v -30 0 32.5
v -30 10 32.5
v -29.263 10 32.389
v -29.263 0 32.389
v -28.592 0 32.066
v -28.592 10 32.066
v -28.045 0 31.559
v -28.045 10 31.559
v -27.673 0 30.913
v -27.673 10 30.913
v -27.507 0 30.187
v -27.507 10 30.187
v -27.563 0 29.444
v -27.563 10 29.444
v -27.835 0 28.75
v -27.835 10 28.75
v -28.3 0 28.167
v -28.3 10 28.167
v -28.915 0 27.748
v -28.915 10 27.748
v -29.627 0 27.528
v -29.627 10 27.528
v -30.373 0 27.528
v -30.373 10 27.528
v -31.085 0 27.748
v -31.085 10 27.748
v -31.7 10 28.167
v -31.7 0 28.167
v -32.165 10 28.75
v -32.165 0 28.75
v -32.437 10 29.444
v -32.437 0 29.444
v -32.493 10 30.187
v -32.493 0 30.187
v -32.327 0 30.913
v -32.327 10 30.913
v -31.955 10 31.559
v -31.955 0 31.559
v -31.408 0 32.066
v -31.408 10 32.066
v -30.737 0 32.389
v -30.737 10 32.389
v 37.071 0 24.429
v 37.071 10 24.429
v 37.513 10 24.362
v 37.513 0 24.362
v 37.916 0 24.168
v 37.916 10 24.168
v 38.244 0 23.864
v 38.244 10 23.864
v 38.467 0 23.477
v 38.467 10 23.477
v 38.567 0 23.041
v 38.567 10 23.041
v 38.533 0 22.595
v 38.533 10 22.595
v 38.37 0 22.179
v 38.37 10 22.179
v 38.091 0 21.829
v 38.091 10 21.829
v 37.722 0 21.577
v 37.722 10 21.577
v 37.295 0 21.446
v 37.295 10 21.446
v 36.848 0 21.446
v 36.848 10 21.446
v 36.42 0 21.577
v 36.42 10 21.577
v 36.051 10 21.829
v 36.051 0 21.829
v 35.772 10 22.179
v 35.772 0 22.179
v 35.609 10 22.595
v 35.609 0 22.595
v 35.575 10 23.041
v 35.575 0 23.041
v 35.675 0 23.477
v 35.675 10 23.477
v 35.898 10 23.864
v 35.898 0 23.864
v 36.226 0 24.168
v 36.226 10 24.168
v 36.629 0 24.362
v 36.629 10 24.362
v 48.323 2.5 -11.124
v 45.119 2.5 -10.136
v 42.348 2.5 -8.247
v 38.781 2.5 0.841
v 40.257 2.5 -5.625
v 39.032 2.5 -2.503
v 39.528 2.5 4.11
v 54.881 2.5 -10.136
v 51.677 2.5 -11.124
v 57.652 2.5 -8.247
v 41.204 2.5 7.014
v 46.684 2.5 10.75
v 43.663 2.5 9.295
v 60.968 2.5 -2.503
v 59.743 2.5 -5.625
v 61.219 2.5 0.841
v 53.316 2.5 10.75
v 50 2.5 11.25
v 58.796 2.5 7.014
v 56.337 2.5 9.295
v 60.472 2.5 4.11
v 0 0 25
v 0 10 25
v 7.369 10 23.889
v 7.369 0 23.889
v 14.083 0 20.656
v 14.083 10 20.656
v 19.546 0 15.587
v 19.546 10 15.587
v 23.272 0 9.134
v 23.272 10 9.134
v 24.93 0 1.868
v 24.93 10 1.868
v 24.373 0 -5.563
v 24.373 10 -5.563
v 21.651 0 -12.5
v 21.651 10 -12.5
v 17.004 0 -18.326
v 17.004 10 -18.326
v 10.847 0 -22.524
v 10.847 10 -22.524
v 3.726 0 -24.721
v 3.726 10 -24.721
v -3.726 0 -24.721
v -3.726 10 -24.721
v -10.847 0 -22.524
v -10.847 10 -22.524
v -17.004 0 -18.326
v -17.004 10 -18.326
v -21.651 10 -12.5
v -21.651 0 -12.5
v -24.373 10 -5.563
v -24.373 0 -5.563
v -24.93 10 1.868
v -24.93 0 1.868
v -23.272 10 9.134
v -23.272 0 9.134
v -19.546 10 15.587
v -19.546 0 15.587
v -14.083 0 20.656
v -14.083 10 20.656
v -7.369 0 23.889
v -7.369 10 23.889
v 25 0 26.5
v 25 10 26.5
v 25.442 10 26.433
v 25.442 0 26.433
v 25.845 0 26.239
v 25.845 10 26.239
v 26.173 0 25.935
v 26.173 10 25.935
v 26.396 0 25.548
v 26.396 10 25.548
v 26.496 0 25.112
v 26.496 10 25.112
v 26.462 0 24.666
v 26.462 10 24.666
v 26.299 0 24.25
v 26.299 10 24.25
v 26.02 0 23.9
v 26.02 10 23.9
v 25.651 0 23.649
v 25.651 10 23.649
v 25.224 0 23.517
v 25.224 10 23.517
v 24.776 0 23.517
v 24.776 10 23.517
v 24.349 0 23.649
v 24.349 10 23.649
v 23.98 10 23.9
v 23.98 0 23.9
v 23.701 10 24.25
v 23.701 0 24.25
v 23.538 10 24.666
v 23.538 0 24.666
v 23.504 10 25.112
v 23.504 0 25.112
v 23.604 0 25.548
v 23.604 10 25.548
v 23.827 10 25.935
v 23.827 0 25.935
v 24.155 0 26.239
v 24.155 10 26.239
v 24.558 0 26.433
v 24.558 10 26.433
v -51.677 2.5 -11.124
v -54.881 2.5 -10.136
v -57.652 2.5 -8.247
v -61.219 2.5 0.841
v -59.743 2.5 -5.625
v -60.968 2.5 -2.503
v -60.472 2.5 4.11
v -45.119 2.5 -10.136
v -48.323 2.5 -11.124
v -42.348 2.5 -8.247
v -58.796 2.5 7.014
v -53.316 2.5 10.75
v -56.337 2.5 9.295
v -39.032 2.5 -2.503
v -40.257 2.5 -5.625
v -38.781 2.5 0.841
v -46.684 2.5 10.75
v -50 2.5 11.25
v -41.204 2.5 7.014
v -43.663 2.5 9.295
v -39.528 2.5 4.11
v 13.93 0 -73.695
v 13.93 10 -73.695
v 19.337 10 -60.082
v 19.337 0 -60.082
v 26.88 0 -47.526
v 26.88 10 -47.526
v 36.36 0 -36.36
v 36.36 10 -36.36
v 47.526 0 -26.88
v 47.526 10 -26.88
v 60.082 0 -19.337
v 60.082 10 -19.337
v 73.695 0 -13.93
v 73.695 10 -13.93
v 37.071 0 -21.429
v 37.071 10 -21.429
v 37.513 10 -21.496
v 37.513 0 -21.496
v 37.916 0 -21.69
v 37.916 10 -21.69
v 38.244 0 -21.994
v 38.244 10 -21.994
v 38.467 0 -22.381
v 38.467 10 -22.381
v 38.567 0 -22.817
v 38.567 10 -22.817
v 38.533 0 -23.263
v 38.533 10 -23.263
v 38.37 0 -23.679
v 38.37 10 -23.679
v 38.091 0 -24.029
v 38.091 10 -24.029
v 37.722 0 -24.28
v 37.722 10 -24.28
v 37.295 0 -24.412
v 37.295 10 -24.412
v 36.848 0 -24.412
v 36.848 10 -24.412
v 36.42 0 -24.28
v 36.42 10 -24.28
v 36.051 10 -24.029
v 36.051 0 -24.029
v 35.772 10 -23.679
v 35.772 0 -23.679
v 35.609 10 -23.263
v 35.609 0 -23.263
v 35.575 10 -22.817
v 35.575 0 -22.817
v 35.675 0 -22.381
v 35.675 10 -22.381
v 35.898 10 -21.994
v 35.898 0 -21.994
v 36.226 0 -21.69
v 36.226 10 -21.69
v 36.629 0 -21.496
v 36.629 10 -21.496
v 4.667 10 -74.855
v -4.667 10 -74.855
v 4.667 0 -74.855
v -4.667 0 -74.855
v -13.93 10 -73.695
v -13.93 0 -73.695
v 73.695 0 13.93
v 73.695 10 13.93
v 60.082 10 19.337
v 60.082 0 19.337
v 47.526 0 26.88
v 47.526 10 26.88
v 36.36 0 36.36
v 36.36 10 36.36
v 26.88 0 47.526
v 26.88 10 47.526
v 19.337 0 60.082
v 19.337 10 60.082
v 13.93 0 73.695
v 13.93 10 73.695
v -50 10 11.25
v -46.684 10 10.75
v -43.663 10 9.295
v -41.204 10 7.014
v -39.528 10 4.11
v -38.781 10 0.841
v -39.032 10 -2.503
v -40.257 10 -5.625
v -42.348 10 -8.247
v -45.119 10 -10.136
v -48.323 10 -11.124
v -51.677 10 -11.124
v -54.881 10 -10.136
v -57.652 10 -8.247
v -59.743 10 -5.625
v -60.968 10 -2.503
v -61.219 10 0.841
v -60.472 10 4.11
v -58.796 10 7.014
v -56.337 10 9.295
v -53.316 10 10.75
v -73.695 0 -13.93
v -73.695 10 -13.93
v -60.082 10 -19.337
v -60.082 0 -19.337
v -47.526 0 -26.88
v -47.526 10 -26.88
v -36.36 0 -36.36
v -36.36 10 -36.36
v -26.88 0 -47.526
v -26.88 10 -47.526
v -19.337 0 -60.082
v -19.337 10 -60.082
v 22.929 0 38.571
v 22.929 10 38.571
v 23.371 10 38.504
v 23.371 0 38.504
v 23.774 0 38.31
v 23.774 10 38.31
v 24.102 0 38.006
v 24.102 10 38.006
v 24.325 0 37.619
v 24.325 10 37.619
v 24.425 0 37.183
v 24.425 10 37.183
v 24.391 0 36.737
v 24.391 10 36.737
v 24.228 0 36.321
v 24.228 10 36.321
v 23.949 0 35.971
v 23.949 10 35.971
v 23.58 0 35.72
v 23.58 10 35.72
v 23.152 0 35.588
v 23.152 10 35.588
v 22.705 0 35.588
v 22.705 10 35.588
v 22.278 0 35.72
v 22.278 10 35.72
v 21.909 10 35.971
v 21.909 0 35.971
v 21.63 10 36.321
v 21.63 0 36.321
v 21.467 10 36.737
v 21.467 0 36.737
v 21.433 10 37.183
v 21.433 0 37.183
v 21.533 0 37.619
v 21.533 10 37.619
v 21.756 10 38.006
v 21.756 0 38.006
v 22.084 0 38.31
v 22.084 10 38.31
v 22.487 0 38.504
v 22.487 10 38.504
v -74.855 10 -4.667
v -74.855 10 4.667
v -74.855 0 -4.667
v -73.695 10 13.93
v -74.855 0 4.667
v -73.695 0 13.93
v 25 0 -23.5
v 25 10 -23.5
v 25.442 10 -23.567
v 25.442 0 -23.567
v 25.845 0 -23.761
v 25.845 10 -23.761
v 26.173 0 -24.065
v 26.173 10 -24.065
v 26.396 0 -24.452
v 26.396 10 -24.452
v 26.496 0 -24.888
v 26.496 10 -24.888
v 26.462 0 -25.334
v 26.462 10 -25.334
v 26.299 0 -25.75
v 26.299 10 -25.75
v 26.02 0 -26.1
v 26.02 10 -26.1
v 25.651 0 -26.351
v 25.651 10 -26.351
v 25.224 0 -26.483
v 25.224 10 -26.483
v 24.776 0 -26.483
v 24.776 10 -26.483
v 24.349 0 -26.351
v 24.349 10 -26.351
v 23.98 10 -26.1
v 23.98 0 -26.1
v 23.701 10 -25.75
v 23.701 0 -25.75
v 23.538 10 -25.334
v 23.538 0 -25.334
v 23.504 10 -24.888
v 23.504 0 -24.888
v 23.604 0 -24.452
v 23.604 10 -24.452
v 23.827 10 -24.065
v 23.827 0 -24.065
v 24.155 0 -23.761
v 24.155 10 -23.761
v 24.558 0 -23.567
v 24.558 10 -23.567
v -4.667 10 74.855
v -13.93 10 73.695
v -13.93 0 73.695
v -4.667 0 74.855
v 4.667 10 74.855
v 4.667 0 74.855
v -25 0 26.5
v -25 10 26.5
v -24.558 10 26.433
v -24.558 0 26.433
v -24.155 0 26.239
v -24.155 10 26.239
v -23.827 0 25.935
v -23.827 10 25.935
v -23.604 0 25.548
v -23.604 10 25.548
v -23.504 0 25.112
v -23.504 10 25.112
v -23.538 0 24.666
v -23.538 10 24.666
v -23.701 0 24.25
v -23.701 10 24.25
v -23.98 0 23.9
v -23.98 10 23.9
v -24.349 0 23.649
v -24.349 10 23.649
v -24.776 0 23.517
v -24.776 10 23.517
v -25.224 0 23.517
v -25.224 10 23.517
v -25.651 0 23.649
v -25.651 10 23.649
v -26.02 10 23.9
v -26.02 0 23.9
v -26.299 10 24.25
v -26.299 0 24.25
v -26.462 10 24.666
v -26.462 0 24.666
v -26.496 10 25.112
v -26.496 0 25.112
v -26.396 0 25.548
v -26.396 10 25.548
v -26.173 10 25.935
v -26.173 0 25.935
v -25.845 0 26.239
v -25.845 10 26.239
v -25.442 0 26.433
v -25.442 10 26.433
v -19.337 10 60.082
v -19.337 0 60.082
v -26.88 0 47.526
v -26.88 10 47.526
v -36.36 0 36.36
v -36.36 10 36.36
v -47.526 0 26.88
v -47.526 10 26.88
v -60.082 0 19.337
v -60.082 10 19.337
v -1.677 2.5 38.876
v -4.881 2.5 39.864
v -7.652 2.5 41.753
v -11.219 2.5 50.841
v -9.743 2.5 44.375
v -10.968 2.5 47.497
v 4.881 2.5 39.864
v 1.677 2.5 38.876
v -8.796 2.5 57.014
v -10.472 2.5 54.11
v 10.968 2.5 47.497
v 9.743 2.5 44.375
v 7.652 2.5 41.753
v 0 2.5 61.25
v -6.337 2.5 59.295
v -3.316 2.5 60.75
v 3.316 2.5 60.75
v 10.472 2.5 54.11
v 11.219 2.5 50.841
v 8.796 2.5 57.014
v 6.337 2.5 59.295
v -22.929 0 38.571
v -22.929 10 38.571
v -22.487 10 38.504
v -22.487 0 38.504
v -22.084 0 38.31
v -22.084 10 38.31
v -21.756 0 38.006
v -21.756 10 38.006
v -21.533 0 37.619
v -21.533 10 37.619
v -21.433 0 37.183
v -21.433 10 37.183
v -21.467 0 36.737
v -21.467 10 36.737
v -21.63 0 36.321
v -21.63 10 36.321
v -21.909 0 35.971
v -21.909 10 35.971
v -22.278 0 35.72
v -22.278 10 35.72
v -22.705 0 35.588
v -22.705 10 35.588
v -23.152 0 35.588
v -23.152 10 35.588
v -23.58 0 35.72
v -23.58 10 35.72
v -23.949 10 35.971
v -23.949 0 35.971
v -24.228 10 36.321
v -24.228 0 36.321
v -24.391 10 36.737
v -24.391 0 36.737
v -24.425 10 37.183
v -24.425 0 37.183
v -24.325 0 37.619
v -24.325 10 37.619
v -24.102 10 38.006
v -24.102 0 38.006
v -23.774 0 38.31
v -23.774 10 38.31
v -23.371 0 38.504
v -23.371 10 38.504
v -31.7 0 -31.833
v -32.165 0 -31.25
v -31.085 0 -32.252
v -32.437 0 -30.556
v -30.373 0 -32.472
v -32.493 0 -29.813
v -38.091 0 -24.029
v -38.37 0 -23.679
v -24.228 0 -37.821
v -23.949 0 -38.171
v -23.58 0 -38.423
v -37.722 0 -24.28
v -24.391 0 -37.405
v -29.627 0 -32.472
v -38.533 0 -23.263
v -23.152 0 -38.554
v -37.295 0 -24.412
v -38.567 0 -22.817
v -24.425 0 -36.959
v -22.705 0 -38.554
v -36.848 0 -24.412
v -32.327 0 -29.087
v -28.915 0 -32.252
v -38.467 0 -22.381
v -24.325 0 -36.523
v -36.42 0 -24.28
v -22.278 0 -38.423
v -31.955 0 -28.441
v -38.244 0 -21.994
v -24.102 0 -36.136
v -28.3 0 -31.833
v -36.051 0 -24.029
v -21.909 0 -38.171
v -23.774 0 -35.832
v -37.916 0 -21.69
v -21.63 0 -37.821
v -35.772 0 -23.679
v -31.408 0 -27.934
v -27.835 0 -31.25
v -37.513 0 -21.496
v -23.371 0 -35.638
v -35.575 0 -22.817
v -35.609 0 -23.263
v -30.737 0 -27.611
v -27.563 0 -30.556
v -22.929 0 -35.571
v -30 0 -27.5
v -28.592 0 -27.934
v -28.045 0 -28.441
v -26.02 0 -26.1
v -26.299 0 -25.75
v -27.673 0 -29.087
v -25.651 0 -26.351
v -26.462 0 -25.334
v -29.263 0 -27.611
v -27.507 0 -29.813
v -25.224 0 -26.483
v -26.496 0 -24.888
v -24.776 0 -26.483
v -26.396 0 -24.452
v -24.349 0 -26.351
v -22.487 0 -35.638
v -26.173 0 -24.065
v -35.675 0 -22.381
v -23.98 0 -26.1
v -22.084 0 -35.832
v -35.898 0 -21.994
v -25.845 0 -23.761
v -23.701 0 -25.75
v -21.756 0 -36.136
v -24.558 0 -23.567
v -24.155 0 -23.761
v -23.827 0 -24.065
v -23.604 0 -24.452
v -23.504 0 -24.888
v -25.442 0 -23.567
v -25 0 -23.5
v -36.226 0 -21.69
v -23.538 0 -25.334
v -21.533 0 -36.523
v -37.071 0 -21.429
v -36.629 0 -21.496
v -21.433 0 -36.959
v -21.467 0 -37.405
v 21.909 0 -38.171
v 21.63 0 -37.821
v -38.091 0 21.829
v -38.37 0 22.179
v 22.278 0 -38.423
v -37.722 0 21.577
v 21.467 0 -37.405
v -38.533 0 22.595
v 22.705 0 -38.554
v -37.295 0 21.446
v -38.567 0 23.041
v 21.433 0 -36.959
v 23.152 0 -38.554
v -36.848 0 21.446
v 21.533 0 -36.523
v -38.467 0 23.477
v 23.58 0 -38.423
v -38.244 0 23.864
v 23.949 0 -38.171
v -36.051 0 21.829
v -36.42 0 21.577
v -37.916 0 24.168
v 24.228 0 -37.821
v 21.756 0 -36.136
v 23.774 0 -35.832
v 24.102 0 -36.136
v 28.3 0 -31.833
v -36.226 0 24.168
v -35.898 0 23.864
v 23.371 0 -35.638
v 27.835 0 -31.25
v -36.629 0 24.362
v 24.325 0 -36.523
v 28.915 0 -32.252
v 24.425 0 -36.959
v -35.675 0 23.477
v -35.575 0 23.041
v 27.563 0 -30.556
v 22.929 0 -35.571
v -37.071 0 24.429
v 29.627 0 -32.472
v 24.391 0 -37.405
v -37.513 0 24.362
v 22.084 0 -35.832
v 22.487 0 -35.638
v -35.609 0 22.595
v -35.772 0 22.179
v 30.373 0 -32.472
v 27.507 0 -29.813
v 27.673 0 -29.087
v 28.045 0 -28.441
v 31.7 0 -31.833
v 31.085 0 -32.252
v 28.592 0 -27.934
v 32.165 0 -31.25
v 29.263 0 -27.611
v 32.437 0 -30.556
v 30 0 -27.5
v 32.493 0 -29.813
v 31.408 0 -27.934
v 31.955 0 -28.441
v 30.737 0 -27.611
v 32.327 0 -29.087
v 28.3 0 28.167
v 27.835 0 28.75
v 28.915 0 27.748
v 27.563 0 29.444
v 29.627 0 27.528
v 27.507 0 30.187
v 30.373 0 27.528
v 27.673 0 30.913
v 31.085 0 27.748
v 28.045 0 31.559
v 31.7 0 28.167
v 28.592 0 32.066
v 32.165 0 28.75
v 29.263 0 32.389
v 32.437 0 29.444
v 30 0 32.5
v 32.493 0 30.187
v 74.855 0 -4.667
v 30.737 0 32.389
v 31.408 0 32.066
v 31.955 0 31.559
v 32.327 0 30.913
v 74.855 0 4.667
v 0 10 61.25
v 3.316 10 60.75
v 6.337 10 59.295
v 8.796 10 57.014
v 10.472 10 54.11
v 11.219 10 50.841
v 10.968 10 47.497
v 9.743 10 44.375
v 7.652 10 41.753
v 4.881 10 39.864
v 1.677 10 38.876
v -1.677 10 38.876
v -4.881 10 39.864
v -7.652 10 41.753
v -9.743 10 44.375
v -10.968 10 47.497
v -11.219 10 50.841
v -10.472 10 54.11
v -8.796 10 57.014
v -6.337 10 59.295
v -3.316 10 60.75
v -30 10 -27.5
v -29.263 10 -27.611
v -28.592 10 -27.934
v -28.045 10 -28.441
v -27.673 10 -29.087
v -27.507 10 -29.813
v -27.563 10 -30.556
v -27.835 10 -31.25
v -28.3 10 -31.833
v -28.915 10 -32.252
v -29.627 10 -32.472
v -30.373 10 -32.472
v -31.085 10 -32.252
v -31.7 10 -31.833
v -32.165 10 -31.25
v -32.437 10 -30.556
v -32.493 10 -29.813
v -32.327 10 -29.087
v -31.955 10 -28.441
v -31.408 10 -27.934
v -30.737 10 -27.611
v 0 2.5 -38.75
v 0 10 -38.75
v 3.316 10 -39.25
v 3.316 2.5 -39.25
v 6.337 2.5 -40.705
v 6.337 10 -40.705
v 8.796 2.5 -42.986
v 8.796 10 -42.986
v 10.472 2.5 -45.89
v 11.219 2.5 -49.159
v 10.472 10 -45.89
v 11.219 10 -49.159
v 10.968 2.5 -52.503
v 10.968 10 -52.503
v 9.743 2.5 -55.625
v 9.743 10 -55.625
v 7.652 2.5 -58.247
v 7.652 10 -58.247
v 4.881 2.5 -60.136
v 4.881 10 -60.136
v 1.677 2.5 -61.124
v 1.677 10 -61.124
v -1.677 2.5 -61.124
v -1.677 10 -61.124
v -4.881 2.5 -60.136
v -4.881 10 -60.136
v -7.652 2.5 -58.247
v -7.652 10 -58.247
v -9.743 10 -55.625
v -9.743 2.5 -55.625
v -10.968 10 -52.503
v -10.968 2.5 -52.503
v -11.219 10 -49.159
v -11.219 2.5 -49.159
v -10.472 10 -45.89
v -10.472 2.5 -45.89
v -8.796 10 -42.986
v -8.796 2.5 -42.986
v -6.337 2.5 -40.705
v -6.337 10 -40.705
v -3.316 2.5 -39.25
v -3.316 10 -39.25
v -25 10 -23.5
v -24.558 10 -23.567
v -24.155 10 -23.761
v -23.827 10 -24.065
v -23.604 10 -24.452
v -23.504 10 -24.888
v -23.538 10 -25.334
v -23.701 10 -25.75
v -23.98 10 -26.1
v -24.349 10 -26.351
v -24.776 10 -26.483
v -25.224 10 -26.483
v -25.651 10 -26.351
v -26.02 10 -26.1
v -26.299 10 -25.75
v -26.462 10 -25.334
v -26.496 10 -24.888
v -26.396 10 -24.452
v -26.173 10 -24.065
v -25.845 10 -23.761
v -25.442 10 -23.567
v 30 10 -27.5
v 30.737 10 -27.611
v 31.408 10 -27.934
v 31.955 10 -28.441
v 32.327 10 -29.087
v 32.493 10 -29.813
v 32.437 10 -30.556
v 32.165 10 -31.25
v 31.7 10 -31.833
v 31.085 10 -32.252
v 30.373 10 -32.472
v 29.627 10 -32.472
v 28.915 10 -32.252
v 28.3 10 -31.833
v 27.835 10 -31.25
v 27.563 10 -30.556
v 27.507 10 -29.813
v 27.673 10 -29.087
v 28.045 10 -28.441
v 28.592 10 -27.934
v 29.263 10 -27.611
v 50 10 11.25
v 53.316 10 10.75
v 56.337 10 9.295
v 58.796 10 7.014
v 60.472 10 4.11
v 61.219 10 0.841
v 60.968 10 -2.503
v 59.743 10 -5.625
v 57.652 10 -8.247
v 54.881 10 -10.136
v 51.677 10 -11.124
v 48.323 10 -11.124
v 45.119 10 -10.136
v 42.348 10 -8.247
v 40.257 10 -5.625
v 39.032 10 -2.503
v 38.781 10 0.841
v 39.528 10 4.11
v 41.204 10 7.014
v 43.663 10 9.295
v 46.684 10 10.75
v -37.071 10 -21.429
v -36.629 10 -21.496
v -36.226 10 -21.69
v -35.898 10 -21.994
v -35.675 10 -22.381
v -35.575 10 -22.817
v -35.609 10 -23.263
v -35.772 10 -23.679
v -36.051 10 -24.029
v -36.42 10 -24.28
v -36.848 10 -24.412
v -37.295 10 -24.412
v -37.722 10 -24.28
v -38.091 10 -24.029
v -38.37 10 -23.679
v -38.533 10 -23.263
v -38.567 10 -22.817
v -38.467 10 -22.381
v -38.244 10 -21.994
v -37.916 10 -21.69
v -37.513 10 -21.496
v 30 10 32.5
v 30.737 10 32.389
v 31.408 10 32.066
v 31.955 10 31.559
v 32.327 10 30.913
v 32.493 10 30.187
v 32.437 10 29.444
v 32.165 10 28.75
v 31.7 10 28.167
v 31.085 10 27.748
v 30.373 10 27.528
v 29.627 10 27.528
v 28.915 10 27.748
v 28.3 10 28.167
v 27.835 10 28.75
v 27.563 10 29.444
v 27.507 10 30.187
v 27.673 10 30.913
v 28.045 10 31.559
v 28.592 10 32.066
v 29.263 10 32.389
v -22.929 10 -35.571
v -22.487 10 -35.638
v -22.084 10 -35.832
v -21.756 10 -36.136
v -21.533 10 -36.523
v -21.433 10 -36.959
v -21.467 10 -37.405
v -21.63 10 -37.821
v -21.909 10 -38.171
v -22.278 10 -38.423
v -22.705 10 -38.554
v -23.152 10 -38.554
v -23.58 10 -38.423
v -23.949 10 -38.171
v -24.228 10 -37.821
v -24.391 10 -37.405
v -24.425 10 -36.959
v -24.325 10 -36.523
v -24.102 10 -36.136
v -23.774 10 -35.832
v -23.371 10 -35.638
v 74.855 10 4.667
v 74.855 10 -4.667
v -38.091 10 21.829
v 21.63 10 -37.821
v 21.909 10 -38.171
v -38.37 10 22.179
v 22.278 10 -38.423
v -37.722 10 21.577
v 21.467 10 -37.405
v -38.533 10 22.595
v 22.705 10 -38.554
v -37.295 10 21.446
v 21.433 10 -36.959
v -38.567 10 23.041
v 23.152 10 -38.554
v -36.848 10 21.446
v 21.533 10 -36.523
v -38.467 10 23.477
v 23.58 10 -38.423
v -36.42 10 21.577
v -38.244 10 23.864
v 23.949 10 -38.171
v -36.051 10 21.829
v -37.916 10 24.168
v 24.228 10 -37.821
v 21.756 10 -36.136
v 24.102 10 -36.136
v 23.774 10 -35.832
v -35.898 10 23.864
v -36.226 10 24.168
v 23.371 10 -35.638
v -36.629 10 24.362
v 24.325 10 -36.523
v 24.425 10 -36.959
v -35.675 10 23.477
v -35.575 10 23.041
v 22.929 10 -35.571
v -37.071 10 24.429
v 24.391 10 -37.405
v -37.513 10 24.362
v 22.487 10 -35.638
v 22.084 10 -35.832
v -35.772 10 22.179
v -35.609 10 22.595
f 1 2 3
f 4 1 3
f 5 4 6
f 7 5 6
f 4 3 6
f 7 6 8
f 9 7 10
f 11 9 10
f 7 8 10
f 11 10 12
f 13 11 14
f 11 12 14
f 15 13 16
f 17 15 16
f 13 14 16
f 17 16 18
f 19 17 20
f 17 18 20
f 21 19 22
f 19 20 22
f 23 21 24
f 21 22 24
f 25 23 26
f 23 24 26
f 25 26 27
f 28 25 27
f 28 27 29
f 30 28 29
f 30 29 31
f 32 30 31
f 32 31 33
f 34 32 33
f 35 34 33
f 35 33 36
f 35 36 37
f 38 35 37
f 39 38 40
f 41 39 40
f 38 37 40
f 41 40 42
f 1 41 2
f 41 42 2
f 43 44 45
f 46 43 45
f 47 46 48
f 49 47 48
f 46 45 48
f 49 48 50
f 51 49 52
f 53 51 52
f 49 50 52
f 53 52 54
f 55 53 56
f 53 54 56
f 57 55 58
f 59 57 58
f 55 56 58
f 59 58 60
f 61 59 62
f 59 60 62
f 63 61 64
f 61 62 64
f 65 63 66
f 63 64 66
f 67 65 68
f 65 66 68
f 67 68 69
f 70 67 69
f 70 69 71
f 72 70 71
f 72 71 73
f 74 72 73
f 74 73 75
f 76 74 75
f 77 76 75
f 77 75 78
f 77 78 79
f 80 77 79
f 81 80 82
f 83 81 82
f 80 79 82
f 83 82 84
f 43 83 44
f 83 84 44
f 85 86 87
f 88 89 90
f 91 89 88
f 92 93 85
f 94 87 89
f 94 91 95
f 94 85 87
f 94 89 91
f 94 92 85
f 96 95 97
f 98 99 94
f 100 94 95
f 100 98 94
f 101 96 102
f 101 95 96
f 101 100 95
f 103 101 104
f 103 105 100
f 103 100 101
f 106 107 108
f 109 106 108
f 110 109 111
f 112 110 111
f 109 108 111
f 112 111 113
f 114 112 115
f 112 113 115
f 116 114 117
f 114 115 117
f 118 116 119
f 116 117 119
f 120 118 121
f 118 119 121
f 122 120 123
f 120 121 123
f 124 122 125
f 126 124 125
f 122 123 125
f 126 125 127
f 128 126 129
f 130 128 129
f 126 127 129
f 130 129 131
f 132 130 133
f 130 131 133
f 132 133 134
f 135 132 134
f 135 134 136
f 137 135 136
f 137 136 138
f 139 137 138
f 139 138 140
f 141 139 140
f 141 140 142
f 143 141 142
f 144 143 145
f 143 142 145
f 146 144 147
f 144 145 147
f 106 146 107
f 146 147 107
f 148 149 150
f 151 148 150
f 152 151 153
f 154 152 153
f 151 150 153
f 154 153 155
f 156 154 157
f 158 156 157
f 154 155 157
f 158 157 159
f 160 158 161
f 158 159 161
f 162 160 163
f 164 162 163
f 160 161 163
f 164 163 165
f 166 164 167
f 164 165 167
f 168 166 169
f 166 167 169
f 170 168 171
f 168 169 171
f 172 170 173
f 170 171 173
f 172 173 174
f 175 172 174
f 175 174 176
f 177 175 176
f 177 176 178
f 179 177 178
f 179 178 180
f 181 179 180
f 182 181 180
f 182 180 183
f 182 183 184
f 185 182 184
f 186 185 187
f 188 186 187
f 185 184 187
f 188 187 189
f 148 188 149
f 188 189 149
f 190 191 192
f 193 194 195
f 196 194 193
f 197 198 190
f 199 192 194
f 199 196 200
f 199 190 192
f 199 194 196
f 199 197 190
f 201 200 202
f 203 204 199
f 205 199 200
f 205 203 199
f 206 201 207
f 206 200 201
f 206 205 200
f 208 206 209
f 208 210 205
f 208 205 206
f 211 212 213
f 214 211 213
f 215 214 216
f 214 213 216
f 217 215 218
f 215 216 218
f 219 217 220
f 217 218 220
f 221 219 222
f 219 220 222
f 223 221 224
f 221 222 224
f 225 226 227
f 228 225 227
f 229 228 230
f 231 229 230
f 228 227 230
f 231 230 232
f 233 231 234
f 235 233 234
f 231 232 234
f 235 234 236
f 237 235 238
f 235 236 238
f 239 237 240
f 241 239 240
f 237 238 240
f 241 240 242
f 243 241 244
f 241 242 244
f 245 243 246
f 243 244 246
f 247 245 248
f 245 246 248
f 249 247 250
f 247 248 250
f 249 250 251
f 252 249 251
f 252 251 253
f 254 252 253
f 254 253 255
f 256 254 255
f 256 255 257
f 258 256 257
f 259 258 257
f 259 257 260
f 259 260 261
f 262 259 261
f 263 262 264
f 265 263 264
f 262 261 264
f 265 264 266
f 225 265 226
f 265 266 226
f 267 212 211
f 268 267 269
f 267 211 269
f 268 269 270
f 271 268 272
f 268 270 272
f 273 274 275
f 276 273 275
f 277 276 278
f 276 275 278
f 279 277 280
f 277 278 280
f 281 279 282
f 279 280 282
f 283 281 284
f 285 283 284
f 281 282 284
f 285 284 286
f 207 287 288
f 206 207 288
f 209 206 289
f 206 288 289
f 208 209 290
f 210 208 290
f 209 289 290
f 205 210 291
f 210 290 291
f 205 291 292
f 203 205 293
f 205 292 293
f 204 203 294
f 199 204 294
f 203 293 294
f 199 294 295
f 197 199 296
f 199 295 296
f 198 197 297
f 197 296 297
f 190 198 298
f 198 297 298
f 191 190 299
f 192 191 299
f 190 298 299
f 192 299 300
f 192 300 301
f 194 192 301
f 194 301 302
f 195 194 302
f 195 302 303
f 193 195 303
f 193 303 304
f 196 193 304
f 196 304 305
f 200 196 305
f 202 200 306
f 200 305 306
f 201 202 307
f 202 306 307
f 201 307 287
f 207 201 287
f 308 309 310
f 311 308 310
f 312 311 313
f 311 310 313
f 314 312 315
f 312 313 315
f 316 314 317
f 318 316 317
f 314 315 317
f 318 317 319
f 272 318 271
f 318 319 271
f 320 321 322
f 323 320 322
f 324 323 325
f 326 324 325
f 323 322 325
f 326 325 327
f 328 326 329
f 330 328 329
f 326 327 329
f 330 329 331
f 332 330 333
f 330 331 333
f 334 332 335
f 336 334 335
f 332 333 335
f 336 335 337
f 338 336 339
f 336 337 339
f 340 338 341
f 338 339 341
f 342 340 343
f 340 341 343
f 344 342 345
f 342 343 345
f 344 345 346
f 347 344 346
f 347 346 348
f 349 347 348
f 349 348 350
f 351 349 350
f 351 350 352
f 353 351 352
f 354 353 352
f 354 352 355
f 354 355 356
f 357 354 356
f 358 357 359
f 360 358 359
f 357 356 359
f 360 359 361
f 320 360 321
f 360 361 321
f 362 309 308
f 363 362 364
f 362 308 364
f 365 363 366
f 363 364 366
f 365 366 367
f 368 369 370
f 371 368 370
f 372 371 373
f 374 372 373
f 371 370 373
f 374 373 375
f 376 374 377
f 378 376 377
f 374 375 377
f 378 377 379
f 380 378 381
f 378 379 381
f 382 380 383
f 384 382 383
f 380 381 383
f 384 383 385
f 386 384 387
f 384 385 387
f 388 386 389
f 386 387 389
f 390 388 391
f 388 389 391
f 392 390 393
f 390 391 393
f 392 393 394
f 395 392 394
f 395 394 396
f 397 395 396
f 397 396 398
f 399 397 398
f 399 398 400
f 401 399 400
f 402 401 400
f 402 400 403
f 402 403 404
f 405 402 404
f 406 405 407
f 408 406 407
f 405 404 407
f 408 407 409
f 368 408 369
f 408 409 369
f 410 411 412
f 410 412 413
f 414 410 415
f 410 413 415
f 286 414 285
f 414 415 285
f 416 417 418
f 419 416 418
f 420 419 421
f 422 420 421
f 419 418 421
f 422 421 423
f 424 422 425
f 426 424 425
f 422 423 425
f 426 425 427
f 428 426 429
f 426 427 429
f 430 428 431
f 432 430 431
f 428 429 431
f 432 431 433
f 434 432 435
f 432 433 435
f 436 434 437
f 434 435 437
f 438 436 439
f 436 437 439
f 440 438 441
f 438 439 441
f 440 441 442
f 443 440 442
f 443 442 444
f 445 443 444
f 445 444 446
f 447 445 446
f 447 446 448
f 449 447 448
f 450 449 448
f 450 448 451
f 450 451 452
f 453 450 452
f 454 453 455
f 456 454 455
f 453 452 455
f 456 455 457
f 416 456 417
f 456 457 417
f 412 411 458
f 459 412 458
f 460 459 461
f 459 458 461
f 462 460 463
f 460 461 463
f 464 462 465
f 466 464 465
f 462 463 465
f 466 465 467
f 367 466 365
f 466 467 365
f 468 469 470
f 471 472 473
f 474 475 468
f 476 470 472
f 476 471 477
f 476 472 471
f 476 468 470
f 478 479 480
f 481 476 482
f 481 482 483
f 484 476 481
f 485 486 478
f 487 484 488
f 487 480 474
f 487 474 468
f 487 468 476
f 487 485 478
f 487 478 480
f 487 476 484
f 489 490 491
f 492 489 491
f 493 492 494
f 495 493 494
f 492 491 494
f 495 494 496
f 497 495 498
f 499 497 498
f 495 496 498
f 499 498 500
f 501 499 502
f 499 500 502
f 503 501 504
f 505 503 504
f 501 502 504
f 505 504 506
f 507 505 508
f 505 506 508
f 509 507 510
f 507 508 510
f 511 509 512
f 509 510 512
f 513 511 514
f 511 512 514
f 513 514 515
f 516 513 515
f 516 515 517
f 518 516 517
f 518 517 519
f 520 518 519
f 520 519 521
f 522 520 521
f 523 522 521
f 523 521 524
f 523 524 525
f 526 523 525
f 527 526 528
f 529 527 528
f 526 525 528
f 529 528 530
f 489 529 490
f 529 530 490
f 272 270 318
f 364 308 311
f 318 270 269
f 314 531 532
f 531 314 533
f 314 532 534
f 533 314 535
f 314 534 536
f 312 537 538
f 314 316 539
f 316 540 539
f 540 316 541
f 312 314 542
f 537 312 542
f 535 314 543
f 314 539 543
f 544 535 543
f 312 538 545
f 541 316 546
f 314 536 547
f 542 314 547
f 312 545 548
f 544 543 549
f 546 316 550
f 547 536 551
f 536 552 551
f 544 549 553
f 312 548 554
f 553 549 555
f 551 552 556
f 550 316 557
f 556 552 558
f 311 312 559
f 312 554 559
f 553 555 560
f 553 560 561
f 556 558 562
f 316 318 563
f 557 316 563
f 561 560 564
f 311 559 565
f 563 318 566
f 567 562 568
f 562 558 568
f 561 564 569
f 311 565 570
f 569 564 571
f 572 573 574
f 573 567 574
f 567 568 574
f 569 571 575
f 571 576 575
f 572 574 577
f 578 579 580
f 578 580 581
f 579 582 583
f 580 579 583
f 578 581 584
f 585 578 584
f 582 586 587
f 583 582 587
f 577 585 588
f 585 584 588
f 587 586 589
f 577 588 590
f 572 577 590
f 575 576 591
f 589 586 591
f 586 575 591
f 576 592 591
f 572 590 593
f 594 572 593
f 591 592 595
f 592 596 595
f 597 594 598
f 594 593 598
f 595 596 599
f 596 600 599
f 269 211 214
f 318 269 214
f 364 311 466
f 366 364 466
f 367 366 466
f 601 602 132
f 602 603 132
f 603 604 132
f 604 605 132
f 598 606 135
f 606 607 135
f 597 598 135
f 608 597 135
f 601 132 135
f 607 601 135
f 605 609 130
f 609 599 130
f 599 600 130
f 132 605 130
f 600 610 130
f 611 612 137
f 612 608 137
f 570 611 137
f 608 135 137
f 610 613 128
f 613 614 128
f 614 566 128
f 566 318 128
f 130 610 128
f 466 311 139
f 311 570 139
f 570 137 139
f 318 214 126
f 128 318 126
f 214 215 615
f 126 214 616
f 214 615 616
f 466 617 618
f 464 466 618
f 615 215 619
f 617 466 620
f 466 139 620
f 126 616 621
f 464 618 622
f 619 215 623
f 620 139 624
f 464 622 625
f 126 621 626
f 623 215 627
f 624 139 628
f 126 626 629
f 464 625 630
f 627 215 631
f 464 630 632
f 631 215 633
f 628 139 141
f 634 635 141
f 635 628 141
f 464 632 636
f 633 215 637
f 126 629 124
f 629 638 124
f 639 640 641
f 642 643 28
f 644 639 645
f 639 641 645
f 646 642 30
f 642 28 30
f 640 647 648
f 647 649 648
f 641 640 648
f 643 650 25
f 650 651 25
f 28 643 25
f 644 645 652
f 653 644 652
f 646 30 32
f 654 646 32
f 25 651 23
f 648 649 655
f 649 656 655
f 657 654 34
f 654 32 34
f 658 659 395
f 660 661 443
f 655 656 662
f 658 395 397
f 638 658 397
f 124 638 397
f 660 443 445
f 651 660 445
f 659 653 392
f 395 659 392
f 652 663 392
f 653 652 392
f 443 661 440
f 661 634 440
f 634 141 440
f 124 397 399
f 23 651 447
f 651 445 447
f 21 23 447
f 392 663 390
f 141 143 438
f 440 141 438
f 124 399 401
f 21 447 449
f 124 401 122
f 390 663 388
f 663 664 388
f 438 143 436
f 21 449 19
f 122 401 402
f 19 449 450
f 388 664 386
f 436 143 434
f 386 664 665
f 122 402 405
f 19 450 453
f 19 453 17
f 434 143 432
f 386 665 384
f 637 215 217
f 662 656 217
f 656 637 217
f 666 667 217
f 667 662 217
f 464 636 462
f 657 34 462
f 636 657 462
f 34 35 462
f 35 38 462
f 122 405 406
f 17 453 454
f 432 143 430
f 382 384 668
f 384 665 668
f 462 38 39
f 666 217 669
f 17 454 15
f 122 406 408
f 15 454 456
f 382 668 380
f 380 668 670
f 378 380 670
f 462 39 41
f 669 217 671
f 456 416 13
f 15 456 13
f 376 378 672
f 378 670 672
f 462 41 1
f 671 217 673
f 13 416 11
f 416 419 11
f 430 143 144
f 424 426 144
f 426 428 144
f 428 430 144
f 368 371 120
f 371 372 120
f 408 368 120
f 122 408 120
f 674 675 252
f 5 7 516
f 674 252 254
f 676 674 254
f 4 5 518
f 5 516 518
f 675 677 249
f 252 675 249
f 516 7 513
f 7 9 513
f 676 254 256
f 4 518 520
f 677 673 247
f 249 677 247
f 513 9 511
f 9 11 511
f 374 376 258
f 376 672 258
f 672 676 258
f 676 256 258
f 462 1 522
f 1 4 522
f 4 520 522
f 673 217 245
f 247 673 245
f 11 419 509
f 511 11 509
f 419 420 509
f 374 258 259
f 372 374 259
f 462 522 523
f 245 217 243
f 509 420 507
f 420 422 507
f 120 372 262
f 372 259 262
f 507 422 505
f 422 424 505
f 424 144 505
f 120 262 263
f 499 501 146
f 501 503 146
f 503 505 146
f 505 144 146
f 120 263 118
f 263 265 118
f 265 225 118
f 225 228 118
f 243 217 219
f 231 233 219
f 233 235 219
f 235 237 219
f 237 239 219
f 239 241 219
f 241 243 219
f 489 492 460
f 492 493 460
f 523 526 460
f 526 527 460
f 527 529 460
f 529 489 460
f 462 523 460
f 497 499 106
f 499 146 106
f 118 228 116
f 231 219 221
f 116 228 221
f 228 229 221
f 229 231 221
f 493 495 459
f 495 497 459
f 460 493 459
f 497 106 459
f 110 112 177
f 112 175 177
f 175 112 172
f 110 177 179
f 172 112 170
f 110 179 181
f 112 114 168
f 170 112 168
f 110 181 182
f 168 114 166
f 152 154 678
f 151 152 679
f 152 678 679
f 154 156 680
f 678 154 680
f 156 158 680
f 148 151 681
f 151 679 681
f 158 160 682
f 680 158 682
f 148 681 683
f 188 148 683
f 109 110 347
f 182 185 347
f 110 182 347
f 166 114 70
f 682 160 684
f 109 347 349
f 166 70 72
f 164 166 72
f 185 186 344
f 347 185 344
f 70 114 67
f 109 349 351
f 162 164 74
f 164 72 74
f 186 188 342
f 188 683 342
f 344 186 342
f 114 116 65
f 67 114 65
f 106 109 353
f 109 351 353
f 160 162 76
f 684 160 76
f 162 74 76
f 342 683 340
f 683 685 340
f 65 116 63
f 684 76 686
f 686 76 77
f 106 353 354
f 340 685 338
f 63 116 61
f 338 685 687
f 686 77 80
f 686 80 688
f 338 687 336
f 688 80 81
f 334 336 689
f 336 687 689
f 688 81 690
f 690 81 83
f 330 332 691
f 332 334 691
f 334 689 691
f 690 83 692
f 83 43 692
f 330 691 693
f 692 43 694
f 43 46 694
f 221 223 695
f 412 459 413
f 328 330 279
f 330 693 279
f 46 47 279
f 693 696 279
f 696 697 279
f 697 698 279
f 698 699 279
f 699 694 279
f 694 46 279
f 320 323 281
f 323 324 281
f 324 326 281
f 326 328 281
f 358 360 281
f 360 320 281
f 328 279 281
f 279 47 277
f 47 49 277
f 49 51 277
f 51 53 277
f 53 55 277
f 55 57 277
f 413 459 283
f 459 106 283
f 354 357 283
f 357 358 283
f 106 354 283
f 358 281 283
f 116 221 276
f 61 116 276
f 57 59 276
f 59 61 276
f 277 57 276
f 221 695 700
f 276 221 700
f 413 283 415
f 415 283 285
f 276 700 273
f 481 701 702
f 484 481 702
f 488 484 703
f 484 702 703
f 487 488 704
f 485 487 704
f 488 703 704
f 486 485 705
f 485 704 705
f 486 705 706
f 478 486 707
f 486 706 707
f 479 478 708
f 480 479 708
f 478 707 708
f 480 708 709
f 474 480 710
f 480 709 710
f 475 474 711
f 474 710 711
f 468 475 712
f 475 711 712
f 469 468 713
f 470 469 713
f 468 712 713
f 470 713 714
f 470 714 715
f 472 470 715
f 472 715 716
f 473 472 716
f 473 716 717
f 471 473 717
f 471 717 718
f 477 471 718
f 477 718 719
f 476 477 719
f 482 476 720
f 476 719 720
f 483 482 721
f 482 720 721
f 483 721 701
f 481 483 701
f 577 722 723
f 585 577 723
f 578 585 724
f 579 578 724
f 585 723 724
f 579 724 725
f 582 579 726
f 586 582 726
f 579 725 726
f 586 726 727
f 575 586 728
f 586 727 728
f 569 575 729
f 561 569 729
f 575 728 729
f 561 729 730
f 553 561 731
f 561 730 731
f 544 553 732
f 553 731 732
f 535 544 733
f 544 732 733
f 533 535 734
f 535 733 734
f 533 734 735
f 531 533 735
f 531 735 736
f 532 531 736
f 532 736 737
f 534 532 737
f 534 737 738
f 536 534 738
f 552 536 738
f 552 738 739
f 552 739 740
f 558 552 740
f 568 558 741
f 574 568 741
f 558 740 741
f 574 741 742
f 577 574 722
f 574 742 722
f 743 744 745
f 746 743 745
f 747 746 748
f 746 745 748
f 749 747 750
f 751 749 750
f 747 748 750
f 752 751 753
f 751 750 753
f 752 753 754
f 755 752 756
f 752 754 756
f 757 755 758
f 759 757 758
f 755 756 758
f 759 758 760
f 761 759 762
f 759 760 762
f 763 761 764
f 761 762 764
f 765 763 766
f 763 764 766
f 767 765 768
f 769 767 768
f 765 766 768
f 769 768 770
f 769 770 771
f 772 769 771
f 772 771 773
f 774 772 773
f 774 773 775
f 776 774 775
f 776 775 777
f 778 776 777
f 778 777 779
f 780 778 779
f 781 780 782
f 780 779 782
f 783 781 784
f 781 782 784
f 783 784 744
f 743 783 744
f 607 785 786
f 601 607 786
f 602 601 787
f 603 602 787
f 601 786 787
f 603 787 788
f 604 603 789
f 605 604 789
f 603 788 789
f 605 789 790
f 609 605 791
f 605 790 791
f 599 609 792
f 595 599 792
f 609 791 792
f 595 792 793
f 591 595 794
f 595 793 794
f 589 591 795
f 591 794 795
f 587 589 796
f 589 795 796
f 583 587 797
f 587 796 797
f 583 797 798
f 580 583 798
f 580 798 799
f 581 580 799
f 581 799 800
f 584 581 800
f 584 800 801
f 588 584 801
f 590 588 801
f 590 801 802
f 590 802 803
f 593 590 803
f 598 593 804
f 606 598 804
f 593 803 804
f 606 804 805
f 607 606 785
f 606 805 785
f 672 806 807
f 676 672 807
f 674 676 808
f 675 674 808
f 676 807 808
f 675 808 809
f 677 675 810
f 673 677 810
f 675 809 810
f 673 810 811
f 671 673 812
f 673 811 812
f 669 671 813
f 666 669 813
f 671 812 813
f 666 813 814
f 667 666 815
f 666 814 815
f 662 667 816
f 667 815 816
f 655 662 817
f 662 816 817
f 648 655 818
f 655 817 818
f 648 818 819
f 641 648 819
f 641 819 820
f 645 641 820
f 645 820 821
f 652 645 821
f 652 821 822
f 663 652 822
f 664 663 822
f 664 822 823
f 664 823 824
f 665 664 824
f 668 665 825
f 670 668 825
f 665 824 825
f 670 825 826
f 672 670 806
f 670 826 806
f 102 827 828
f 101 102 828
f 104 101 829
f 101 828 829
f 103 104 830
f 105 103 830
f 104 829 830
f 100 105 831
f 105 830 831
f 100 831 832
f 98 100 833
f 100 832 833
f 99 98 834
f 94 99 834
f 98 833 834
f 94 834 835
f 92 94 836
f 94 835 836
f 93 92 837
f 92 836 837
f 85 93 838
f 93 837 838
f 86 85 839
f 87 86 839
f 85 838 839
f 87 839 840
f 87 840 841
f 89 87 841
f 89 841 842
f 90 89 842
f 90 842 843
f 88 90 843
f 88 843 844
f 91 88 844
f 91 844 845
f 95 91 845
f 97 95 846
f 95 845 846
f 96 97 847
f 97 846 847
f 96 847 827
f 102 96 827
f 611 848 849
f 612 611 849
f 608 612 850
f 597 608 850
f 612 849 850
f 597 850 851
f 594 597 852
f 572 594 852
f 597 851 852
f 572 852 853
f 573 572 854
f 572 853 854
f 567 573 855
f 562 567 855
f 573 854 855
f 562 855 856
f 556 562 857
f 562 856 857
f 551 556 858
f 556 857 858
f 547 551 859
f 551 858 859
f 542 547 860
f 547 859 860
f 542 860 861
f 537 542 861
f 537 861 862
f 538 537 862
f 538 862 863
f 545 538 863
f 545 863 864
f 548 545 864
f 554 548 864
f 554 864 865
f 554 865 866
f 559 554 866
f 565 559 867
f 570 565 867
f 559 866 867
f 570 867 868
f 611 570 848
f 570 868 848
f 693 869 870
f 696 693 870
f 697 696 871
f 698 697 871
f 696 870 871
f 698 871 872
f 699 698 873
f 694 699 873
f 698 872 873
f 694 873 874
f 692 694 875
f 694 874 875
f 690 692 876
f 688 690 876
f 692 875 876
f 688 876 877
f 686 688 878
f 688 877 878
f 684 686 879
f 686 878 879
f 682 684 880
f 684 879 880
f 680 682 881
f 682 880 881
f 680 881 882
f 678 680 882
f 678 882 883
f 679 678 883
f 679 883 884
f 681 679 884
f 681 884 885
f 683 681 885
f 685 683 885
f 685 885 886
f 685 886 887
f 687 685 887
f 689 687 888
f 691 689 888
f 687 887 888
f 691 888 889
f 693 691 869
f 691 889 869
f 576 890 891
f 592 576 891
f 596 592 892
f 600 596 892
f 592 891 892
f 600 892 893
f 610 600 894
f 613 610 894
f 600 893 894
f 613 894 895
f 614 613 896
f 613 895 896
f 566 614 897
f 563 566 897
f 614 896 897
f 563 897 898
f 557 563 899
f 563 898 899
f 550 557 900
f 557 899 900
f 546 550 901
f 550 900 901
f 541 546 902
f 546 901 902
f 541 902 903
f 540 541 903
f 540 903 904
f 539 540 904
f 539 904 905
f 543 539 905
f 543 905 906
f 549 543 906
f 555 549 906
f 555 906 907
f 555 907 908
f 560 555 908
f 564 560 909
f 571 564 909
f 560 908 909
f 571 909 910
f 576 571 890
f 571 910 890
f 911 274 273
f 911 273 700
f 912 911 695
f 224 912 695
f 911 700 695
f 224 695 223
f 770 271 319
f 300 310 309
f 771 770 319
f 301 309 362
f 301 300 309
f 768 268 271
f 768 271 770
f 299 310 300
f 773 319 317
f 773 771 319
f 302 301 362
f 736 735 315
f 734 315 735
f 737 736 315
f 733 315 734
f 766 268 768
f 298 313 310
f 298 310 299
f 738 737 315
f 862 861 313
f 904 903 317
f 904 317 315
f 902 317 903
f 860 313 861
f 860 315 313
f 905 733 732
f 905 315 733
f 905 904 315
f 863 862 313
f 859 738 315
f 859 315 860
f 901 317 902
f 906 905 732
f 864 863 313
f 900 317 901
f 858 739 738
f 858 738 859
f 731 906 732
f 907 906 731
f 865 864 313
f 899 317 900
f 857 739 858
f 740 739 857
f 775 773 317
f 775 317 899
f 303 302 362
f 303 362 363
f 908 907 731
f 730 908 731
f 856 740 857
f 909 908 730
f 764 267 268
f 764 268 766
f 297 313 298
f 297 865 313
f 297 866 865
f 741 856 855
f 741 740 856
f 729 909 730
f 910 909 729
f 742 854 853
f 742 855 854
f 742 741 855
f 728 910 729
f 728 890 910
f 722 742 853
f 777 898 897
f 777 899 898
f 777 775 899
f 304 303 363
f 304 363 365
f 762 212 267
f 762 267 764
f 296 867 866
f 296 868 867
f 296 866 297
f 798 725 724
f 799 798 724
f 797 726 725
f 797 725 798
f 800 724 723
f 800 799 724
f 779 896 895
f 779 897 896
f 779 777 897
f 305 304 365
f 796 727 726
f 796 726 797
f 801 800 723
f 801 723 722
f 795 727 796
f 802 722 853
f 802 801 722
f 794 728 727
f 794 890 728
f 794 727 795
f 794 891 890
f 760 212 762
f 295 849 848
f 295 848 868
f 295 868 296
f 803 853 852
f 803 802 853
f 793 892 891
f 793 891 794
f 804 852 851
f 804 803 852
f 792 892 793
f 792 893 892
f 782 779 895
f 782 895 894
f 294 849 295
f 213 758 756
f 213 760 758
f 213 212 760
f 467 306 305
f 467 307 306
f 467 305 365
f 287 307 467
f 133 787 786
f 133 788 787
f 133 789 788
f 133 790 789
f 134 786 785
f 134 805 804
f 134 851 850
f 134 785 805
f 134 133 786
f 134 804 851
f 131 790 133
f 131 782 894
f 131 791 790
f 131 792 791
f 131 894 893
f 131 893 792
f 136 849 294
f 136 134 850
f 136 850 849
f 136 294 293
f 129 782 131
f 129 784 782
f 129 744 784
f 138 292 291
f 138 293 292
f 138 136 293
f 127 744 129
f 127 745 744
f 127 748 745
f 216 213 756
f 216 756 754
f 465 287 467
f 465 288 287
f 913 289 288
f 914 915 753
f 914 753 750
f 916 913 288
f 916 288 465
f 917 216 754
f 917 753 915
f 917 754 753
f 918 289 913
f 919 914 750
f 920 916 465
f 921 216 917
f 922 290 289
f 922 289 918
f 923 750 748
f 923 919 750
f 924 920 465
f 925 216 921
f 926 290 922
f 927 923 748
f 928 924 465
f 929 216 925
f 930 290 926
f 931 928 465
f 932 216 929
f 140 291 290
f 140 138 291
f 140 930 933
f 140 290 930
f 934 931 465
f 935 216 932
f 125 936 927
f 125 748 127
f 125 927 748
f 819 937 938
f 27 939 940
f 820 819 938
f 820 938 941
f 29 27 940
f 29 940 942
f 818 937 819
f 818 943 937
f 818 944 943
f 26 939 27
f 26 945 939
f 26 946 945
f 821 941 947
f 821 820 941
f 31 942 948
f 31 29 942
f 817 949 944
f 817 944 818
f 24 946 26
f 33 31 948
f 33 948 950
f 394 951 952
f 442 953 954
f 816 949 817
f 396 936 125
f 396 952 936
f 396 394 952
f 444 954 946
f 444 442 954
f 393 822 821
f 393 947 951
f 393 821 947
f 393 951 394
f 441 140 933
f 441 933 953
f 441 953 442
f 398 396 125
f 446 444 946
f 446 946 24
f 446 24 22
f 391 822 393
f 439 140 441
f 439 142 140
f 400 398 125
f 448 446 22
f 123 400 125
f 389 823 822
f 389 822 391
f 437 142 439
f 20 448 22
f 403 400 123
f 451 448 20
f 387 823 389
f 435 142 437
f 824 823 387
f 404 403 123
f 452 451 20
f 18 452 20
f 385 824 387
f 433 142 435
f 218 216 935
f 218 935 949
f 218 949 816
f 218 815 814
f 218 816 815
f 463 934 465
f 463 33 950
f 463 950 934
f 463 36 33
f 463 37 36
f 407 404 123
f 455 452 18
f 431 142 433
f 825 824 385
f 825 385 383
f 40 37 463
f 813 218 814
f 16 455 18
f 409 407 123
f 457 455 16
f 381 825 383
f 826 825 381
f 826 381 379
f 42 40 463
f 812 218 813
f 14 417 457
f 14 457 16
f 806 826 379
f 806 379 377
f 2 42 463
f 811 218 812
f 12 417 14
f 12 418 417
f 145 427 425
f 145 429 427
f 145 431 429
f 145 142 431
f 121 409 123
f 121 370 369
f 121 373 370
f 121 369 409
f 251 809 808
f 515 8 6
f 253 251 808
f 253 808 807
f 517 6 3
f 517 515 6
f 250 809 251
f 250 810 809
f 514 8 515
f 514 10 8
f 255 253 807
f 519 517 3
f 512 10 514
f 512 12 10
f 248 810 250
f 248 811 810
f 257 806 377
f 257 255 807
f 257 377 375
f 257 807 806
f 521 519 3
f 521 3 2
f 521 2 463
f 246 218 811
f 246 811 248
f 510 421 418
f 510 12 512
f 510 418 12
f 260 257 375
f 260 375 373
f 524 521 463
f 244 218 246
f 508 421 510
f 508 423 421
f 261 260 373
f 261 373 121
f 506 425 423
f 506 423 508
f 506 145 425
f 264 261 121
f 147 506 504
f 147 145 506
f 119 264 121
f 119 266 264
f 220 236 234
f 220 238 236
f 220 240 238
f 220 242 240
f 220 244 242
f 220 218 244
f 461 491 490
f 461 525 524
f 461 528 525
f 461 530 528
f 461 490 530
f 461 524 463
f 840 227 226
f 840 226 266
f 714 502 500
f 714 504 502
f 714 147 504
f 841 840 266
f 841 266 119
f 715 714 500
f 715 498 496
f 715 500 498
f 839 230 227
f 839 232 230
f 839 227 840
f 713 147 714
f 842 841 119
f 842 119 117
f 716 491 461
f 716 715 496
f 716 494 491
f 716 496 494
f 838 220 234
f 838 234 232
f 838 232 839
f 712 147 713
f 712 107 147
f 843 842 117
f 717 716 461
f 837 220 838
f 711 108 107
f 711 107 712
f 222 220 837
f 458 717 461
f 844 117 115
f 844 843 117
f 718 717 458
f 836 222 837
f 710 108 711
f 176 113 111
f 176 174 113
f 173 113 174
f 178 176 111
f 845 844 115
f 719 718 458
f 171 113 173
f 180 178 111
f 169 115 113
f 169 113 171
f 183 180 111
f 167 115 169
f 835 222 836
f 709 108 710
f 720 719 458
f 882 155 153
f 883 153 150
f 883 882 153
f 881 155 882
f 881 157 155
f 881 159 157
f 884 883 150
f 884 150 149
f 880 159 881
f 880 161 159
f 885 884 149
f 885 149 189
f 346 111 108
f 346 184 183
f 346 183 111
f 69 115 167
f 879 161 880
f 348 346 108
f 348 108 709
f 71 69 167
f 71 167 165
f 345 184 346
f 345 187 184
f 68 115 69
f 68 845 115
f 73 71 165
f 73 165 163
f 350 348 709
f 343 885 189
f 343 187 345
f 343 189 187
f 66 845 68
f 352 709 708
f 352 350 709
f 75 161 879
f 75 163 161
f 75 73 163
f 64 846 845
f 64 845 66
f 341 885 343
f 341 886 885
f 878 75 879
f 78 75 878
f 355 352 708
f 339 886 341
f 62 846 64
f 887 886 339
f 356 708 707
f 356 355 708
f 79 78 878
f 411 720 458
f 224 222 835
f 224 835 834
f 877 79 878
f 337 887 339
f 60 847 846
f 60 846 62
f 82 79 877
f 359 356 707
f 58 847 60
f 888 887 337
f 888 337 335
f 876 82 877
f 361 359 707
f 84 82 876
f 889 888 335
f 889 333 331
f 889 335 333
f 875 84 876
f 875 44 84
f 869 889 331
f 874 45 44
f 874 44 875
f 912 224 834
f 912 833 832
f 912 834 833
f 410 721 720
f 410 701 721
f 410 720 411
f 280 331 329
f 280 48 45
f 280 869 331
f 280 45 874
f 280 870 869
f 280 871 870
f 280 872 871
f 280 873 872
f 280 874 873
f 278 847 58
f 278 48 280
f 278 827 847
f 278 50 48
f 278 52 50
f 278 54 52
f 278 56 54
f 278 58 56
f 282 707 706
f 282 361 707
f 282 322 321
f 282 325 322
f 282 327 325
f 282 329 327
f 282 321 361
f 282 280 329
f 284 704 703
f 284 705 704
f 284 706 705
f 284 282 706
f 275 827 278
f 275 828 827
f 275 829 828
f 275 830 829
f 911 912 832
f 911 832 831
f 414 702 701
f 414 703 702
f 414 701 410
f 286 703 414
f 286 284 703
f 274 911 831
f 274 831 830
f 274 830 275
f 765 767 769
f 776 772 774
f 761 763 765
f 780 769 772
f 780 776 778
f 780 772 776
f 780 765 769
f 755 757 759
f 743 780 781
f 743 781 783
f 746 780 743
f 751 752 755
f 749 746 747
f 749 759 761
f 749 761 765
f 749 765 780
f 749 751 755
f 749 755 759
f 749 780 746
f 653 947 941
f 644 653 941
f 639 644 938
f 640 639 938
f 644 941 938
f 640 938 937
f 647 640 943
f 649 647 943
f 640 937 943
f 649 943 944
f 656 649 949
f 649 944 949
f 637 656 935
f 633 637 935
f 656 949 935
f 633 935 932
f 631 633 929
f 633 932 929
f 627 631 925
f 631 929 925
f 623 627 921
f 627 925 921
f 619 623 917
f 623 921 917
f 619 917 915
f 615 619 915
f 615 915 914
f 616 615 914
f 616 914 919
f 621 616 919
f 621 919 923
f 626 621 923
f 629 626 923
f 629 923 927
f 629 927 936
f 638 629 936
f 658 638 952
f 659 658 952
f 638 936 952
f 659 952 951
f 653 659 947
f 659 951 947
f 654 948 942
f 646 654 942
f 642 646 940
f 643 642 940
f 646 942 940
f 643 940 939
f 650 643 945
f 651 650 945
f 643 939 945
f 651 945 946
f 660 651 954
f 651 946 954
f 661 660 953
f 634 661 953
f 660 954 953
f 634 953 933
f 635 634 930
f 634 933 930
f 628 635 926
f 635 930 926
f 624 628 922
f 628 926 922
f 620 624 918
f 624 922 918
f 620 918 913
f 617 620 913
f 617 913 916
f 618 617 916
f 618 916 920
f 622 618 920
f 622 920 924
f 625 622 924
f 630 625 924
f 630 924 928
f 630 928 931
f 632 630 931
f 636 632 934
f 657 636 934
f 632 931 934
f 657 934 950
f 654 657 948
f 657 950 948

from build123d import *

# Parameters (mm, degrees)
SKETCH1_R           = 75
BOSS_EXTRUDE1_DEPTH = 10
SKETCH4_R           = 90
CUT_EXTRUDE2_DEPTH  = 10
SKETCH5_R           = 2.5
SKETCH5_R_2         = 25
SKETCH5_R_3         = 1.5
CUT_EXTRUDE3_DEPTH  = 10
SKETCH6_R           = 1.5
CUT_EXTRUDE4_DEPTH  = 10
SKETCH8_R           = 11.25
CUT_EXTRUDE5_DEPTH  = 7.5


with BuildPart() as part:
    # Sketch1 → Boss-Extrude1 (new body)
    with BuildSketch(Plane(origin=(0, 0, 0), x_dir=(1, 0, 0), z_dir=(0, 1, 0))):
        Circle(SKETCH1_R)
    extrude(amount=BOSS_EXTRUDE1_DEPTH)

    # Sketch4 → Cut-Extrude2 (cut)
    with BuildSketch(Plane(origin=(0, 10, 0), x_dir=(1, 0, 0), z_dir=(0, 1, 0))):
        with Locations((-100, 100)):
            Circle(SKETCH4_R)
        with Locations((100, 100)):
            Circle(SKETCH4_R)
        with Locations((100, -100)):
            Circle(SKETCH4_R)
        with Locations((-100, -100)):
            Circle(SKETCH4_R)
    extrude(amount=-CUT_EXTRUDE2_DEPTH, mode=Mode.SUBTRACT)

    # Sketch5 → Cut-Extrude3 (cut)
    with BuildSketch(Plane(origin=(0, 10, 0), x_dir=(1, 0, 0), z_dir=(0, 1, 0))):
        with Locations((-30, 30)):
            Circle(SKETCH5_R)
        with Locations((30, 30)):
            Circle(SKETCH5_R)
        with Locations((30, -30)):
            Circle(SKETCH5_R)
        with Locations((-30, -30)):
            Circle(SKETCH5_R)
        Circle(SKETCH5_R_2)
        with Locations((-37.071067812, -22.928932188)):
            Circle(SKETCH5_R_3)
        with Locations((-22.928932188, -37.071067812)):
            Circle(SKETCH5_R_3)
        with Locations((22.928932188, -37.071067812)):
            Circle(SKETCH5_R_3)
        with Locations((37.071067812, -22.928932188)):
            Circle(SKETCH5_R_3)
        with Locations((37.071067812, 22.928932188)):
            Circle(SKETCH5_R_3)
        with Locations((22.928932188, 37.071067812)):
            Circle(SKETCH5_R_3)
        with Locations((-22.928932188, 37.071067812)):
            Circle(SKETCH5_R_3)
        with Locations((-37.071067812, 22.928932188)):
            Circle(SKETCH5_R_3)
    extrude(amount=-CUT_EXTRUDE3_DEPTH, mode=Mode.SUBTRACT)

    # Sketch6 → Cut-Extrude4 (cut)
    with BuildSketch(Plane(origin=(0, 10, 0), x_dir=(1, 0, 0), z_dir=(0, 1, 0))):
        with Locations((-25, 25)):
            Circle(SKETCH6_R)
        with Locations((25, 25)):
            Circle(SKETCH6_R)
        with Locations((25, -25)):
            Circle(SKETCH6_R)
        with Locations((-25, -25)):
            Circle(SKETCH6_R)
    extrude(amount=-CUT_EXTRUDE4_DEPTH, mode=Mode.SUBTRACT)

    # Sketch8 → Cut-Extrude5 (cut)
    with BuildSketch(Plane(origin=(0, 10, 0), x_dir=(1, 0, 0), z_dir=(0, 1, 0))):
        with Locations((-50, 0)):
            Circle(SKETCH8_R)
        with Locations((0, 50)):
            Circle(SKETCH8_R)
        with Locations((50, 0)):
            Circle(SKETCH8_R)
        with Locations((0, -50)):
            Circle(SKETCH8_R)
    extrude(amount=-CUT_EXTRUDE5_DEPTH, mode=Mode.SUBTRACT)


solid = part.part
